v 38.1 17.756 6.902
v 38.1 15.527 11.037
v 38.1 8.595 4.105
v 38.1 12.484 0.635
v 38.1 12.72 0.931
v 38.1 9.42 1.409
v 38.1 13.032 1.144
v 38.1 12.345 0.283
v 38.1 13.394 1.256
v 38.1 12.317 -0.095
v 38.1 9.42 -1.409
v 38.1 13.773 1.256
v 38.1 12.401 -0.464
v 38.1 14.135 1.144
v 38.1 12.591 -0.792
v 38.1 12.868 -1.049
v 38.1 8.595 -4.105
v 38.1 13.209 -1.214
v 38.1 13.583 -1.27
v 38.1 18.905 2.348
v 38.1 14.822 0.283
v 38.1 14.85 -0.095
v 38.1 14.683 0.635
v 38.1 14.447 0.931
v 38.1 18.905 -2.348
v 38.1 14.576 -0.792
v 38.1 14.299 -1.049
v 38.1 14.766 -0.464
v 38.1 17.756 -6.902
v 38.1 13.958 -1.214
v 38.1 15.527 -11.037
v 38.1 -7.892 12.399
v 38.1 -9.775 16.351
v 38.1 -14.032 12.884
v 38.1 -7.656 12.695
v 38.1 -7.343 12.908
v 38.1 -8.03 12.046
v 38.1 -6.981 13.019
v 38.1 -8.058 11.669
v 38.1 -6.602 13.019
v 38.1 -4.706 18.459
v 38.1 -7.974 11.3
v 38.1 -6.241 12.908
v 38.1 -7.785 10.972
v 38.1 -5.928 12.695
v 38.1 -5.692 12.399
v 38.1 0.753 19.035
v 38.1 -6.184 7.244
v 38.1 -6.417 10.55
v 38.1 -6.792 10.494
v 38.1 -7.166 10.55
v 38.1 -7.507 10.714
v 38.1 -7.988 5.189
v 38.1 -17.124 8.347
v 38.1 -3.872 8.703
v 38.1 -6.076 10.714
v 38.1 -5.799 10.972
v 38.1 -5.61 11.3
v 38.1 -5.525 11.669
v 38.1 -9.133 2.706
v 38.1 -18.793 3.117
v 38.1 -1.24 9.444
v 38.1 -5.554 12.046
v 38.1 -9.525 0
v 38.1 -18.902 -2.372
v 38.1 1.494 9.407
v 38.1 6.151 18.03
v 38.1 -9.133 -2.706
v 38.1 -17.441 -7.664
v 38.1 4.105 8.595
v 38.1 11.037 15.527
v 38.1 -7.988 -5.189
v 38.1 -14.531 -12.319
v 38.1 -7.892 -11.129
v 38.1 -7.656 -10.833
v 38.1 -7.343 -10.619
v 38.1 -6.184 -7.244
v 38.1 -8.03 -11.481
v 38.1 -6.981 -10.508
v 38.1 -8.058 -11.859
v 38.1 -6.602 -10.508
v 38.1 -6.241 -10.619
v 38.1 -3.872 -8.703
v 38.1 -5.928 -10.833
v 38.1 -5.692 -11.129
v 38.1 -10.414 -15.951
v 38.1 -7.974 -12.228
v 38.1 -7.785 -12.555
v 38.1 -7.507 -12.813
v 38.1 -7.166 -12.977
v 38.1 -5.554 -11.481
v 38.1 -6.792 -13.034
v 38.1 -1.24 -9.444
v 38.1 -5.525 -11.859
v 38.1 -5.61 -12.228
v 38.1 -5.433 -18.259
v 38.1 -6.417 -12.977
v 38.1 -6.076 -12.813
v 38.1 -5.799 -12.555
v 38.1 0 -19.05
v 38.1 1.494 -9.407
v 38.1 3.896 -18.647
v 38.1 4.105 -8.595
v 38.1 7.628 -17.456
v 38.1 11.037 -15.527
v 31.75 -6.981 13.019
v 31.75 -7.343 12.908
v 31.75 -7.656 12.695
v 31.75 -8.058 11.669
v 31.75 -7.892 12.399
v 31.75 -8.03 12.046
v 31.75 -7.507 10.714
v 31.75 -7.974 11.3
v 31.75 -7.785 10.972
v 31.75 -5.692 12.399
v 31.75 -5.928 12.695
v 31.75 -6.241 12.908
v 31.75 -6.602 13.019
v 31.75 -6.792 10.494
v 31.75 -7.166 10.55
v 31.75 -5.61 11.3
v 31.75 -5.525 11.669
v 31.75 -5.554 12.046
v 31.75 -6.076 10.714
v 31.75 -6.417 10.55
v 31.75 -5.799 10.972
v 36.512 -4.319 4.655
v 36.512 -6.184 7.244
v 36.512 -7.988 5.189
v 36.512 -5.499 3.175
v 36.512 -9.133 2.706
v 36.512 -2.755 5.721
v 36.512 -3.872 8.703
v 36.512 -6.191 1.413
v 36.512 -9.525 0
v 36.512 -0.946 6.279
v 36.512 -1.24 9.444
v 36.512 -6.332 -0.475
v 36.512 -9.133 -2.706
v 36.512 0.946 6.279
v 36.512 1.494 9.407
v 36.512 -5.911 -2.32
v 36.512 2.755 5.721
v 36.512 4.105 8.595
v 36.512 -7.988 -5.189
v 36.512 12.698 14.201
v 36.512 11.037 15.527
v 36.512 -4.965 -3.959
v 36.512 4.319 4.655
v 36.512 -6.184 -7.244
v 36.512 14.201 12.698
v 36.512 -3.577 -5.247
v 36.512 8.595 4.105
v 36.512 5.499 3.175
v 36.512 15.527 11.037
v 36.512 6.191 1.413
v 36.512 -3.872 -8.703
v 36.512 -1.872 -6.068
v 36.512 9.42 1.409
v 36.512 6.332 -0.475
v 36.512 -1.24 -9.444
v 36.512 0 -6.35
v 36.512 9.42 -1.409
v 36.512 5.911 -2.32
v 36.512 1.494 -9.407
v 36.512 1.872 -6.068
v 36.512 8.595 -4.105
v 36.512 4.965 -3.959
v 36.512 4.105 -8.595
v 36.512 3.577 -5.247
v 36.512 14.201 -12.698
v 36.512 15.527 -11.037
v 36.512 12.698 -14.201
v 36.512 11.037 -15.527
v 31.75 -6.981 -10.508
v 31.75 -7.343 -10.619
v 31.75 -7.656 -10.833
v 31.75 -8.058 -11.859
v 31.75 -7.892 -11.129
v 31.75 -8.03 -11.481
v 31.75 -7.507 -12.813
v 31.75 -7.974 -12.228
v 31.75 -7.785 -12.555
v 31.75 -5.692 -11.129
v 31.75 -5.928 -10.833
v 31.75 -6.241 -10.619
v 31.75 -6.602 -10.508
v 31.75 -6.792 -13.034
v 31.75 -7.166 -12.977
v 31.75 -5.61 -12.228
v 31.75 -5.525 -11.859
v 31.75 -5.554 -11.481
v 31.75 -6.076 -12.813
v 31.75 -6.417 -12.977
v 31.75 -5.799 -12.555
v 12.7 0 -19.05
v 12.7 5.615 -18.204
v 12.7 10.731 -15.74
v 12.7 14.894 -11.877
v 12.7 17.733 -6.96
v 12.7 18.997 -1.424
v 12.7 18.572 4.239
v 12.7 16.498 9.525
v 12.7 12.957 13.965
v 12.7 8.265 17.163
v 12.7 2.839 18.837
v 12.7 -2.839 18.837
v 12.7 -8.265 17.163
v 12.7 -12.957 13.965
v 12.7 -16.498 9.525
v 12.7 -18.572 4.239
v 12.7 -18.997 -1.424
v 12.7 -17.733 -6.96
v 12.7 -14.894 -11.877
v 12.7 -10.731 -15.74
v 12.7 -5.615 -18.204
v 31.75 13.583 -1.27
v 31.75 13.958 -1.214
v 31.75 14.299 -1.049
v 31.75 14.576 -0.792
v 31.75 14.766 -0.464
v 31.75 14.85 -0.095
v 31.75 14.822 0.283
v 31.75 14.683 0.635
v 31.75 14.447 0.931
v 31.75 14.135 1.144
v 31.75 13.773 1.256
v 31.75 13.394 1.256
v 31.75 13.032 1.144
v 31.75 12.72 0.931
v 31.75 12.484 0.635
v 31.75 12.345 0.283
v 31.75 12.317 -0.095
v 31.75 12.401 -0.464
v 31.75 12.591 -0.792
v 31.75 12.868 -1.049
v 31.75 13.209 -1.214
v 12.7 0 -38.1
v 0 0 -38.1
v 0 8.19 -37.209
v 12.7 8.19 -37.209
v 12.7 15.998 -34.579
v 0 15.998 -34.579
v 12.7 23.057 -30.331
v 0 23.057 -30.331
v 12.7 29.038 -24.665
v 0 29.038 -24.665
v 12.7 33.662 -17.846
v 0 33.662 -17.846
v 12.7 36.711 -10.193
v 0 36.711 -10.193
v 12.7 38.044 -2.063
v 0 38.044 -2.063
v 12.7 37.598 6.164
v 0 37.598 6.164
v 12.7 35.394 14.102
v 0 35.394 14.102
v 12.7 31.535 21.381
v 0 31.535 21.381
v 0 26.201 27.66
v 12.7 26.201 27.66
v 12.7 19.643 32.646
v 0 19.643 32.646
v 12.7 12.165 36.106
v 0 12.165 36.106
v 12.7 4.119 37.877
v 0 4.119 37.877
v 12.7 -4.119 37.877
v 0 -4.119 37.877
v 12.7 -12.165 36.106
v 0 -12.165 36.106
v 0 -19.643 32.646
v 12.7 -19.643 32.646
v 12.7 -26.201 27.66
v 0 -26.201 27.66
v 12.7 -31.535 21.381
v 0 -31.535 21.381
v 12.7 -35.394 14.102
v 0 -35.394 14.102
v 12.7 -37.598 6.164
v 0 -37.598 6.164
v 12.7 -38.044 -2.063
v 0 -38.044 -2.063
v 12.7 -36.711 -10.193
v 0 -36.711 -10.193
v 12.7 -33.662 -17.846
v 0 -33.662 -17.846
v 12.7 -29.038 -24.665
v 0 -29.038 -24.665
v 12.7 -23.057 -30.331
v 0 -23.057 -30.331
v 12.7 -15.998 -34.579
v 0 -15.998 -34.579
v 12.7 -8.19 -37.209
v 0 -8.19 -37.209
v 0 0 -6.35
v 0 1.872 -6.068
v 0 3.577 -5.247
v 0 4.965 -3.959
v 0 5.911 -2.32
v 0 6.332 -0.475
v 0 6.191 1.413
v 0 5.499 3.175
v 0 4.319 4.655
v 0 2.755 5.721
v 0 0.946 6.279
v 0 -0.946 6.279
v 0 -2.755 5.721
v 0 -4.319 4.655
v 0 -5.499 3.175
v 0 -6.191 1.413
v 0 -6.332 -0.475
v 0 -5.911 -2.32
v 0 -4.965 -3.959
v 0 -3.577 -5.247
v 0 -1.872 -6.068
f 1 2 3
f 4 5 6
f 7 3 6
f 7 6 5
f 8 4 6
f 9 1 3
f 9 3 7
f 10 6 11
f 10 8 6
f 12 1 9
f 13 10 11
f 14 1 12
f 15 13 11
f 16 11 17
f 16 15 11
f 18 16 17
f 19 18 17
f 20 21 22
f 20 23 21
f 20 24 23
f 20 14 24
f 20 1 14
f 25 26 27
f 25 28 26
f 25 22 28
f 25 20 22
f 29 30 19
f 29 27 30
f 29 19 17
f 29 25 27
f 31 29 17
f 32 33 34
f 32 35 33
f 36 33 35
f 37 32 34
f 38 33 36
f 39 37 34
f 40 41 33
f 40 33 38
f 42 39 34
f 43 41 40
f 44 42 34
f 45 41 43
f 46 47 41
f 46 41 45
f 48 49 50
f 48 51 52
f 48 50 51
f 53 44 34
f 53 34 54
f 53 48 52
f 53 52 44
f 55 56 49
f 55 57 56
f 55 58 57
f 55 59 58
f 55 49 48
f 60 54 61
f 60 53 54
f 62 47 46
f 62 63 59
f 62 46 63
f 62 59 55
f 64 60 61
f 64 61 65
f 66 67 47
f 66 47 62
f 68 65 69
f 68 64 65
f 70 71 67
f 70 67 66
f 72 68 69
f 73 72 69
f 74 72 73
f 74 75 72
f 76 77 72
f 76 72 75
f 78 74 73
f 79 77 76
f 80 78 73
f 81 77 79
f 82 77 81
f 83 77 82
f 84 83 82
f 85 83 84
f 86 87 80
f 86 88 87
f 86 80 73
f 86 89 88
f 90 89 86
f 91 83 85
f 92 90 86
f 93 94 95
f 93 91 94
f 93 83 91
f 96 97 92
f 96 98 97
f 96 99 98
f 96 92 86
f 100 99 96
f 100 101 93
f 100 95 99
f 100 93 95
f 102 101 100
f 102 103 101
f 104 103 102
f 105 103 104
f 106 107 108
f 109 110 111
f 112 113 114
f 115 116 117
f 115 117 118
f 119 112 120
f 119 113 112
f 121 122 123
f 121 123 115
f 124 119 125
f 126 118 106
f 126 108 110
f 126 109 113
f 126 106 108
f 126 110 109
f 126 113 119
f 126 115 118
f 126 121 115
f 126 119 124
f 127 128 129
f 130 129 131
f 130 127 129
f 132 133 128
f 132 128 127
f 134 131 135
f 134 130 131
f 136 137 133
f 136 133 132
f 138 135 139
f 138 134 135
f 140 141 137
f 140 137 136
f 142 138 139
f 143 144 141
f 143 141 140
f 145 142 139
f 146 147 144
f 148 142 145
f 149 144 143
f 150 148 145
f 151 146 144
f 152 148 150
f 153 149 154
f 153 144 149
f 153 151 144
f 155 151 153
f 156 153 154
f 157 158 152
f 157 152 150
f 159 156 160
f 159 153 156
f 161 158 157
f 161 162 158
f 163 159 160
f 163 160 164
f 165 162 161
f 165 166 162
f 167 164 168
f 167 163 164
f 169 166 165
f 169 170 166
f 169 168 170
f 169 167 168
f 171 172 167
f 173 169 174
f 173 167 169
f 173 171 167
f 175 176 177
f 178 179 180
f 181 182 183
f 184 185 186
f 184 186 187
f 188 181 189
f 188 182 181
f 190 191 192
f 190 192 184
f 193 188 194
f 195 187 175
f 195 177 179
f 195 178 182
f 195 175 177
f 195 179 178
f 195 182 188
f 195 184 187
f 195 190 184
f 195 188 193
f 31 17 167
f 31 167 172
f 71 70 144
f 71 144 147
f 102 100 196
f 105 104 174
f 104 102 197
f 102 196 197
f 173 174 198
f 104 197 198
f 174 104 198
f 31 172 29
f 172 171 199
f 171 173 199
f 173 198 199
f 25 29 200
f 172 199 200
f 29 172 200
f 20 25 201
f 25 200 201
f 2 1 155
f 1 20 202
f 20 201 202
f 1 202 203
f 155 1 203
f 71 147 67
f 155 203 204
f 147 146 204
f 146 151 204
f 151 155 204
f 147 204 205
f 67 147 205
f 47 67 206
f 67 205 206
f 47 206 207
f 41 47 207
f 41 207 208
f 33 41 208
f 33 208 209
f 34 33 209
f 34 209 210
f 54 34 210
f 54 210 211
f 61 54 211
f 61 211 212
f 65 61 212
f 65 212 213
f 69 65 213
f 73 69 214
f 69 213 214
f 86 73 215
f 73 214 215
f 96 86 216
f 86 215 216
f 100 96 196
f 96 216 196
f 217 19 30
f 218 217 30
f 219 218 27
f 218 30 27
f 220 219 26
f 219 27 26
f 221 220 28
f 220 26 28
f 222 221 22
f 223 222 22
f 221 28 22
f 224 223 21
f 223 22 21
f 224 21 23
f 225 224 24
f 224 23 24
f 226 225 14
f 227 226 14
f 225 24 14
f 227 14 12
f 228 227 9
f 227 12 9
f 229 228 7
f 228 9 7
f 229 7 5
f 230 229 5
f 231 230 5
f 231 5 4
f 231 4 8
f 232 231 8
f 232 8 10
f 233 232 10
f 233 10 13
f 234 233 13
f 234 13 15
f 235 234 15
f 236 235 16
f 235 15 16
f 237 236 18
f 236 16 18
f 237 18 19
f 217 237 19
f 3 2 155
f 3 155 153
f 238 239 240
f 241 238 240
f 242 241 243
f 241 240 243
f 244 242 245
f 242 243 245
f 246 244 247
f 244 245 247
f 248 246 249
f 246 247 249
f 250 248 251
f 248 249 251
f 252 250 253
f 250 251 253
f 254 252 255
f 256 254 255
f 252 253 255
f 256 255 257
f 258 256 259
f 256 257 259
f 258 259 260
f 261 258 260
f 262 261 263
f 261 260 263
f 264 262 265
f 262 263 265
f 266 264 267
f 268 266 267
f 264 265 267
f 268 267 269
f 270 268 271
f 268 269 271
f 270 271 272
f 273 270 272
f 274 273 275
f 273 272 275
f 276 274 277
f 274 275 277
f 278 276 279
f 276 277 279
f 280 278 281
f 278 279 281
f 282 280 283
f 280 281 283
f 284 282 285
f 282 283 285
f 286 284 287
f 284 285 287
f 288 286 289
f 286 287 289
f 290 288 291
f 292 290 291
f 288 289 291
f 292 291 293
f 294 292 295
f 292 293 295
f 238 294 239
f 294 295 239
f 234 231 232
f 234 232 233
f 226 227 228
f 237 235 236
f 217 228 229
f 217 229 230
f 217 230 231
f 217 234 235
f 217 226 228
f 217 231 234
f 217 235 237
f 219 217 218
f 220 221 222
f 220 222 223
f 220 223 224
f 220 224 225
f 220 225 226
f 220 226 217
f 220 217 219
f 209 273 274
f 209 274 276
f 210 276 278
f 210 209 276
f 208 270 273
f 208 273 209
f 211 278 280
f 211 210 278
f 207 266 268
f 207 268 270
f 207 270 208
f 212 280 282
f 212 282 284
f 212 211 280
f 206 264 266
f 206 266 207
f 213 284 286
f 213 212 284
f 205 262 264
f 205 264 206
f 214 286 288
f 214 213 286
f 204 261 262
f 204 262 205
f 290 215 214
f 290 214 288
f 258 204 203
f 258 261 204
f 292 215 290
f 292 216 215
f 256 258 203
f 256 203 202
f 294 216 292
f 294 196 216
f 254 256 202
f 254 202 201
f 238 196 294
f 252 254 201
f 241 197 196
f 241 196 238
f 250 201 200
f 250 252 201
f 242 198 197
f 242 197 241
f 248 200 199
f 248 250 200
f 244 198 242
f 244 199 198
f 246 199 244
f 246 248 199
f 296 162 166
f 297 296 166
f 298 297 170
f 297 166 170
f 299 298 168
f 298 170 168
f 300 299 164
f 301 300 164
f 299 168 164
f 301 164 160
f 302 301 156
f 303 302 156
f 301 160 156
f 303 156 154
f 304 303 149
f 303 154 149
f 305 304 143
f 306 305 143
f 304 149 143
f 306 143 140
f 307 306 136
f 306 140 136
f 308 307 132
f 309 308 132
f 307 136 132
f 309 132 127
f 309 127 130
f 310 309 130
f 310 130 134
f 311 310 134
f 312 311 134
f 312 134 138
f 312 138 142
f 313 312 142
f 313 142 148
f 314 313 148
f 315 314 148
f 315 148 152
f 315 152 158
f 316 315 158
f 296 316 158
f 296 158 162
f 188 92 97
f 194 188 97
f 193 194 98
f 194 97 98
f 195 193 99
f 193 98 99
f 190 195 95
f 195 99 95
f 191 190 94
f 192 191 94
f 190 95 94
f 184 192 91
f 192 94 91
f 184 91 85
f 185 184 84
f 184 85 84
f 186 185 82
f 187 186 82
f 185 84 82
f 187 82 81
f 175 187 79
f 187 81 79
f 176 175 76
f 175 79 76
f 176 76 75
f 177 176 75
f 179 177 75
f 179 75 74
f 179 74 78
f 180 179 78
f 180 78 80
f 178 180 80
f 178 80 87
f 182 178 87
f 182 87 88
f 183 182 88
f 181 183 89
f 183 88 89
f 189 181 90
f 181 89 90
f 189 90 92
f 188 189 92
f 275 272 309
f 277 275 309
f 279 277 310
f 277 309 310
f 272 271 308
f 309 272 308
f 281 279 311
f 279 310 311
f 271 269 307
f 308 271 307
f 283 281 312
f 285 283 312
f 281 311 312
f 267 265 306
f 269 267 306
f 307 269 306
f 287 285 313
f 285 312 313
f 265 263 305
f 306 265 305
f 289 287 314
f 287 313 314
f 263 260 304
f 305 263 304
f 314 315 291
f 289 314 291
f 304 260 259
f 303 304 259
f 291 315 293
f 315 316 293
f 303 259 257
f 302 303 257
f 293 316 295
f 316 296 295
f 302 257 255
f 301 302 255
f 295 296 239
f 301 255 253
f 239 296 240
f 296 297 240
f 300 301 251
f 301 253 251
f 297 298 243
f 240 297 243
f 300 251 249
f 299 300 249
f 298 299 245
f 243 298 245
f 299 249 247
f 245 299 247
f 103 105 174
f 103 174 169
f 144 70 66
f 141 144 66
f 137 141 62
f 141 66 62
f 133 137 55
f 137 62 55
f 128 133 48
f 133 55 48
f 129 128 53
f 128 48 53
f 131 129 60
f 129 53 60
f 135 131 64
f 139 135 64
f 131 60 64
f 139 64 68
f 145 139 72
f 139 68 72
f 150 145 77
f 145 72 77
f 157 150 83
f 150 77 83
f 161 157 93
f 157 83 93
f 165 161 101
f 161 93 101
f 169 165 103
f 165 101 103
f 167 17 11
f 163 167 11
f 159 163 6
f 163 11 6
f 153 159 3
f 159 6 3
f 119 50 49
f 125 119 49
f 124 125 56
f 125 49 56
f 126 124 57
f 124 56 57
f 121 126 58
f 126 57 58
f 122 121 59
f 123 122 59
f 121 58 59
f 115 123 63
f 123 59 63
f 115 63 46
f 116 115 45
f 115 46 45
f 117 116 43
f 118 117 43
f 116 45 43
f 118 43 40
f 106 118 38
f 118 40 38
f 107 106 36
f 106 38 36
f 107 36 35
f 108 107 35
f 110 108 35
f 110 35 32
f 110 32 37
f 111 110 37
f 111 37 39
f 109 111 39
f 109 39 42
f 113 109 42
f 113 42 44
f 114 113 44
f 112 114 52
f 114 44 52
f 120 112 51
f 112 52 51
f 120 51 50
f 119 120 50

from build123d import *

# Parameters (mm, degrees)
SKETCH1_R           = 38.1
BOSS_EXTRUDE1_DEPTH = 12.7
SKETCH2_R           = 19.05
BOSS_EXTRUDE2_DEPTH = 25.4
SKETCH3_R           = 6.35
CUT_EXTRUDE1_DEPTH  = 66.991135768
SKETCH4_R           = 1.27
CUT_EXTRUDE2_DEPTH  = 6.35
SKETCH5_R           = 9.525
CUT_EXTRUDE3_DEPTH  = 1.5875


with BuildPart() as part:
    # Sketch1 → Boss-Extrude1 (new body)
    with BuildSketch(Plane(origin=(0, 0, 0), x_dir=(0, 0, -1), z_dir=(1, 0, 0))):
        Circle(SKETCH1_R)
    extrude(amount=BOSS_EXTRUDE1_DEPTH)

    # Sketch2 → Boss-Extrude2 (add)
    with BuildSketch(Plane(origin=(12.7, 0, 0), x_dir=(0, 0, -1), z_dir=(1, 0, 0))):
        Circle(SKETCH2_R)
    extrude(amount=BOSS_EXTRUDE2_DEPTH)

    # Sketch3 → Cut-Extrude1 (cut, through all)
    with BuildSketch(Plane(origin=(38.1, 0, 0), x_dir=(0, 0, -1), z_dir=(1, 0, 0))):
        Circle(SKETCH3_R)
    extrude(amount=-CUT_EXTRUDE1_DEPTH, mode=Mode.SUBTRACT)

    # Sketch4 → Cut-Extrude2 (cut)
    with BuildSketch(Plane(origin=(38.1, 0, 0), x_dir=(0, 0, -1), z_dir=(1, 0, 0))):
        with Locations((0, 13.583482333)):
            Circle(SKETCH4_R)
        with Locations((11.763640772, -6.791741166)):
            Circle(SKETCH4_R)
        with Locations((-11.763640772, -6.791741166)):
            Circle(SKETCH4_R)
    extrude(amount=-CUT_EXTRUDE2_DEPTH, mode=Mode.SUBTRACT)

    # Sketch5 → Cut-Extrude3 (cut)
    with BuildSketch(Plane(origin=(38.1, 0, 0), x_dir=(0, 0, -1), z_dir=(1, 0, 0))):
        Circle(SKETCH5_R)
        Polygon((-15.715448212, 11.225320151), (-11.225320151, 15.715448212), (2.24506403, 2.24506403), (-2.24506403, -2.24506403), align=None)
        Polygon((15.715448212, 11.225320151), (2.24506403, -2.24506403), (-2.24506403, 2.24506403), (11.225320151, 15.715448212), align=None)
    extrude(amount=-CUT_EXTRUDE3_DEPTH, mode=Mode.SUBTRACT)


solid = part.part
